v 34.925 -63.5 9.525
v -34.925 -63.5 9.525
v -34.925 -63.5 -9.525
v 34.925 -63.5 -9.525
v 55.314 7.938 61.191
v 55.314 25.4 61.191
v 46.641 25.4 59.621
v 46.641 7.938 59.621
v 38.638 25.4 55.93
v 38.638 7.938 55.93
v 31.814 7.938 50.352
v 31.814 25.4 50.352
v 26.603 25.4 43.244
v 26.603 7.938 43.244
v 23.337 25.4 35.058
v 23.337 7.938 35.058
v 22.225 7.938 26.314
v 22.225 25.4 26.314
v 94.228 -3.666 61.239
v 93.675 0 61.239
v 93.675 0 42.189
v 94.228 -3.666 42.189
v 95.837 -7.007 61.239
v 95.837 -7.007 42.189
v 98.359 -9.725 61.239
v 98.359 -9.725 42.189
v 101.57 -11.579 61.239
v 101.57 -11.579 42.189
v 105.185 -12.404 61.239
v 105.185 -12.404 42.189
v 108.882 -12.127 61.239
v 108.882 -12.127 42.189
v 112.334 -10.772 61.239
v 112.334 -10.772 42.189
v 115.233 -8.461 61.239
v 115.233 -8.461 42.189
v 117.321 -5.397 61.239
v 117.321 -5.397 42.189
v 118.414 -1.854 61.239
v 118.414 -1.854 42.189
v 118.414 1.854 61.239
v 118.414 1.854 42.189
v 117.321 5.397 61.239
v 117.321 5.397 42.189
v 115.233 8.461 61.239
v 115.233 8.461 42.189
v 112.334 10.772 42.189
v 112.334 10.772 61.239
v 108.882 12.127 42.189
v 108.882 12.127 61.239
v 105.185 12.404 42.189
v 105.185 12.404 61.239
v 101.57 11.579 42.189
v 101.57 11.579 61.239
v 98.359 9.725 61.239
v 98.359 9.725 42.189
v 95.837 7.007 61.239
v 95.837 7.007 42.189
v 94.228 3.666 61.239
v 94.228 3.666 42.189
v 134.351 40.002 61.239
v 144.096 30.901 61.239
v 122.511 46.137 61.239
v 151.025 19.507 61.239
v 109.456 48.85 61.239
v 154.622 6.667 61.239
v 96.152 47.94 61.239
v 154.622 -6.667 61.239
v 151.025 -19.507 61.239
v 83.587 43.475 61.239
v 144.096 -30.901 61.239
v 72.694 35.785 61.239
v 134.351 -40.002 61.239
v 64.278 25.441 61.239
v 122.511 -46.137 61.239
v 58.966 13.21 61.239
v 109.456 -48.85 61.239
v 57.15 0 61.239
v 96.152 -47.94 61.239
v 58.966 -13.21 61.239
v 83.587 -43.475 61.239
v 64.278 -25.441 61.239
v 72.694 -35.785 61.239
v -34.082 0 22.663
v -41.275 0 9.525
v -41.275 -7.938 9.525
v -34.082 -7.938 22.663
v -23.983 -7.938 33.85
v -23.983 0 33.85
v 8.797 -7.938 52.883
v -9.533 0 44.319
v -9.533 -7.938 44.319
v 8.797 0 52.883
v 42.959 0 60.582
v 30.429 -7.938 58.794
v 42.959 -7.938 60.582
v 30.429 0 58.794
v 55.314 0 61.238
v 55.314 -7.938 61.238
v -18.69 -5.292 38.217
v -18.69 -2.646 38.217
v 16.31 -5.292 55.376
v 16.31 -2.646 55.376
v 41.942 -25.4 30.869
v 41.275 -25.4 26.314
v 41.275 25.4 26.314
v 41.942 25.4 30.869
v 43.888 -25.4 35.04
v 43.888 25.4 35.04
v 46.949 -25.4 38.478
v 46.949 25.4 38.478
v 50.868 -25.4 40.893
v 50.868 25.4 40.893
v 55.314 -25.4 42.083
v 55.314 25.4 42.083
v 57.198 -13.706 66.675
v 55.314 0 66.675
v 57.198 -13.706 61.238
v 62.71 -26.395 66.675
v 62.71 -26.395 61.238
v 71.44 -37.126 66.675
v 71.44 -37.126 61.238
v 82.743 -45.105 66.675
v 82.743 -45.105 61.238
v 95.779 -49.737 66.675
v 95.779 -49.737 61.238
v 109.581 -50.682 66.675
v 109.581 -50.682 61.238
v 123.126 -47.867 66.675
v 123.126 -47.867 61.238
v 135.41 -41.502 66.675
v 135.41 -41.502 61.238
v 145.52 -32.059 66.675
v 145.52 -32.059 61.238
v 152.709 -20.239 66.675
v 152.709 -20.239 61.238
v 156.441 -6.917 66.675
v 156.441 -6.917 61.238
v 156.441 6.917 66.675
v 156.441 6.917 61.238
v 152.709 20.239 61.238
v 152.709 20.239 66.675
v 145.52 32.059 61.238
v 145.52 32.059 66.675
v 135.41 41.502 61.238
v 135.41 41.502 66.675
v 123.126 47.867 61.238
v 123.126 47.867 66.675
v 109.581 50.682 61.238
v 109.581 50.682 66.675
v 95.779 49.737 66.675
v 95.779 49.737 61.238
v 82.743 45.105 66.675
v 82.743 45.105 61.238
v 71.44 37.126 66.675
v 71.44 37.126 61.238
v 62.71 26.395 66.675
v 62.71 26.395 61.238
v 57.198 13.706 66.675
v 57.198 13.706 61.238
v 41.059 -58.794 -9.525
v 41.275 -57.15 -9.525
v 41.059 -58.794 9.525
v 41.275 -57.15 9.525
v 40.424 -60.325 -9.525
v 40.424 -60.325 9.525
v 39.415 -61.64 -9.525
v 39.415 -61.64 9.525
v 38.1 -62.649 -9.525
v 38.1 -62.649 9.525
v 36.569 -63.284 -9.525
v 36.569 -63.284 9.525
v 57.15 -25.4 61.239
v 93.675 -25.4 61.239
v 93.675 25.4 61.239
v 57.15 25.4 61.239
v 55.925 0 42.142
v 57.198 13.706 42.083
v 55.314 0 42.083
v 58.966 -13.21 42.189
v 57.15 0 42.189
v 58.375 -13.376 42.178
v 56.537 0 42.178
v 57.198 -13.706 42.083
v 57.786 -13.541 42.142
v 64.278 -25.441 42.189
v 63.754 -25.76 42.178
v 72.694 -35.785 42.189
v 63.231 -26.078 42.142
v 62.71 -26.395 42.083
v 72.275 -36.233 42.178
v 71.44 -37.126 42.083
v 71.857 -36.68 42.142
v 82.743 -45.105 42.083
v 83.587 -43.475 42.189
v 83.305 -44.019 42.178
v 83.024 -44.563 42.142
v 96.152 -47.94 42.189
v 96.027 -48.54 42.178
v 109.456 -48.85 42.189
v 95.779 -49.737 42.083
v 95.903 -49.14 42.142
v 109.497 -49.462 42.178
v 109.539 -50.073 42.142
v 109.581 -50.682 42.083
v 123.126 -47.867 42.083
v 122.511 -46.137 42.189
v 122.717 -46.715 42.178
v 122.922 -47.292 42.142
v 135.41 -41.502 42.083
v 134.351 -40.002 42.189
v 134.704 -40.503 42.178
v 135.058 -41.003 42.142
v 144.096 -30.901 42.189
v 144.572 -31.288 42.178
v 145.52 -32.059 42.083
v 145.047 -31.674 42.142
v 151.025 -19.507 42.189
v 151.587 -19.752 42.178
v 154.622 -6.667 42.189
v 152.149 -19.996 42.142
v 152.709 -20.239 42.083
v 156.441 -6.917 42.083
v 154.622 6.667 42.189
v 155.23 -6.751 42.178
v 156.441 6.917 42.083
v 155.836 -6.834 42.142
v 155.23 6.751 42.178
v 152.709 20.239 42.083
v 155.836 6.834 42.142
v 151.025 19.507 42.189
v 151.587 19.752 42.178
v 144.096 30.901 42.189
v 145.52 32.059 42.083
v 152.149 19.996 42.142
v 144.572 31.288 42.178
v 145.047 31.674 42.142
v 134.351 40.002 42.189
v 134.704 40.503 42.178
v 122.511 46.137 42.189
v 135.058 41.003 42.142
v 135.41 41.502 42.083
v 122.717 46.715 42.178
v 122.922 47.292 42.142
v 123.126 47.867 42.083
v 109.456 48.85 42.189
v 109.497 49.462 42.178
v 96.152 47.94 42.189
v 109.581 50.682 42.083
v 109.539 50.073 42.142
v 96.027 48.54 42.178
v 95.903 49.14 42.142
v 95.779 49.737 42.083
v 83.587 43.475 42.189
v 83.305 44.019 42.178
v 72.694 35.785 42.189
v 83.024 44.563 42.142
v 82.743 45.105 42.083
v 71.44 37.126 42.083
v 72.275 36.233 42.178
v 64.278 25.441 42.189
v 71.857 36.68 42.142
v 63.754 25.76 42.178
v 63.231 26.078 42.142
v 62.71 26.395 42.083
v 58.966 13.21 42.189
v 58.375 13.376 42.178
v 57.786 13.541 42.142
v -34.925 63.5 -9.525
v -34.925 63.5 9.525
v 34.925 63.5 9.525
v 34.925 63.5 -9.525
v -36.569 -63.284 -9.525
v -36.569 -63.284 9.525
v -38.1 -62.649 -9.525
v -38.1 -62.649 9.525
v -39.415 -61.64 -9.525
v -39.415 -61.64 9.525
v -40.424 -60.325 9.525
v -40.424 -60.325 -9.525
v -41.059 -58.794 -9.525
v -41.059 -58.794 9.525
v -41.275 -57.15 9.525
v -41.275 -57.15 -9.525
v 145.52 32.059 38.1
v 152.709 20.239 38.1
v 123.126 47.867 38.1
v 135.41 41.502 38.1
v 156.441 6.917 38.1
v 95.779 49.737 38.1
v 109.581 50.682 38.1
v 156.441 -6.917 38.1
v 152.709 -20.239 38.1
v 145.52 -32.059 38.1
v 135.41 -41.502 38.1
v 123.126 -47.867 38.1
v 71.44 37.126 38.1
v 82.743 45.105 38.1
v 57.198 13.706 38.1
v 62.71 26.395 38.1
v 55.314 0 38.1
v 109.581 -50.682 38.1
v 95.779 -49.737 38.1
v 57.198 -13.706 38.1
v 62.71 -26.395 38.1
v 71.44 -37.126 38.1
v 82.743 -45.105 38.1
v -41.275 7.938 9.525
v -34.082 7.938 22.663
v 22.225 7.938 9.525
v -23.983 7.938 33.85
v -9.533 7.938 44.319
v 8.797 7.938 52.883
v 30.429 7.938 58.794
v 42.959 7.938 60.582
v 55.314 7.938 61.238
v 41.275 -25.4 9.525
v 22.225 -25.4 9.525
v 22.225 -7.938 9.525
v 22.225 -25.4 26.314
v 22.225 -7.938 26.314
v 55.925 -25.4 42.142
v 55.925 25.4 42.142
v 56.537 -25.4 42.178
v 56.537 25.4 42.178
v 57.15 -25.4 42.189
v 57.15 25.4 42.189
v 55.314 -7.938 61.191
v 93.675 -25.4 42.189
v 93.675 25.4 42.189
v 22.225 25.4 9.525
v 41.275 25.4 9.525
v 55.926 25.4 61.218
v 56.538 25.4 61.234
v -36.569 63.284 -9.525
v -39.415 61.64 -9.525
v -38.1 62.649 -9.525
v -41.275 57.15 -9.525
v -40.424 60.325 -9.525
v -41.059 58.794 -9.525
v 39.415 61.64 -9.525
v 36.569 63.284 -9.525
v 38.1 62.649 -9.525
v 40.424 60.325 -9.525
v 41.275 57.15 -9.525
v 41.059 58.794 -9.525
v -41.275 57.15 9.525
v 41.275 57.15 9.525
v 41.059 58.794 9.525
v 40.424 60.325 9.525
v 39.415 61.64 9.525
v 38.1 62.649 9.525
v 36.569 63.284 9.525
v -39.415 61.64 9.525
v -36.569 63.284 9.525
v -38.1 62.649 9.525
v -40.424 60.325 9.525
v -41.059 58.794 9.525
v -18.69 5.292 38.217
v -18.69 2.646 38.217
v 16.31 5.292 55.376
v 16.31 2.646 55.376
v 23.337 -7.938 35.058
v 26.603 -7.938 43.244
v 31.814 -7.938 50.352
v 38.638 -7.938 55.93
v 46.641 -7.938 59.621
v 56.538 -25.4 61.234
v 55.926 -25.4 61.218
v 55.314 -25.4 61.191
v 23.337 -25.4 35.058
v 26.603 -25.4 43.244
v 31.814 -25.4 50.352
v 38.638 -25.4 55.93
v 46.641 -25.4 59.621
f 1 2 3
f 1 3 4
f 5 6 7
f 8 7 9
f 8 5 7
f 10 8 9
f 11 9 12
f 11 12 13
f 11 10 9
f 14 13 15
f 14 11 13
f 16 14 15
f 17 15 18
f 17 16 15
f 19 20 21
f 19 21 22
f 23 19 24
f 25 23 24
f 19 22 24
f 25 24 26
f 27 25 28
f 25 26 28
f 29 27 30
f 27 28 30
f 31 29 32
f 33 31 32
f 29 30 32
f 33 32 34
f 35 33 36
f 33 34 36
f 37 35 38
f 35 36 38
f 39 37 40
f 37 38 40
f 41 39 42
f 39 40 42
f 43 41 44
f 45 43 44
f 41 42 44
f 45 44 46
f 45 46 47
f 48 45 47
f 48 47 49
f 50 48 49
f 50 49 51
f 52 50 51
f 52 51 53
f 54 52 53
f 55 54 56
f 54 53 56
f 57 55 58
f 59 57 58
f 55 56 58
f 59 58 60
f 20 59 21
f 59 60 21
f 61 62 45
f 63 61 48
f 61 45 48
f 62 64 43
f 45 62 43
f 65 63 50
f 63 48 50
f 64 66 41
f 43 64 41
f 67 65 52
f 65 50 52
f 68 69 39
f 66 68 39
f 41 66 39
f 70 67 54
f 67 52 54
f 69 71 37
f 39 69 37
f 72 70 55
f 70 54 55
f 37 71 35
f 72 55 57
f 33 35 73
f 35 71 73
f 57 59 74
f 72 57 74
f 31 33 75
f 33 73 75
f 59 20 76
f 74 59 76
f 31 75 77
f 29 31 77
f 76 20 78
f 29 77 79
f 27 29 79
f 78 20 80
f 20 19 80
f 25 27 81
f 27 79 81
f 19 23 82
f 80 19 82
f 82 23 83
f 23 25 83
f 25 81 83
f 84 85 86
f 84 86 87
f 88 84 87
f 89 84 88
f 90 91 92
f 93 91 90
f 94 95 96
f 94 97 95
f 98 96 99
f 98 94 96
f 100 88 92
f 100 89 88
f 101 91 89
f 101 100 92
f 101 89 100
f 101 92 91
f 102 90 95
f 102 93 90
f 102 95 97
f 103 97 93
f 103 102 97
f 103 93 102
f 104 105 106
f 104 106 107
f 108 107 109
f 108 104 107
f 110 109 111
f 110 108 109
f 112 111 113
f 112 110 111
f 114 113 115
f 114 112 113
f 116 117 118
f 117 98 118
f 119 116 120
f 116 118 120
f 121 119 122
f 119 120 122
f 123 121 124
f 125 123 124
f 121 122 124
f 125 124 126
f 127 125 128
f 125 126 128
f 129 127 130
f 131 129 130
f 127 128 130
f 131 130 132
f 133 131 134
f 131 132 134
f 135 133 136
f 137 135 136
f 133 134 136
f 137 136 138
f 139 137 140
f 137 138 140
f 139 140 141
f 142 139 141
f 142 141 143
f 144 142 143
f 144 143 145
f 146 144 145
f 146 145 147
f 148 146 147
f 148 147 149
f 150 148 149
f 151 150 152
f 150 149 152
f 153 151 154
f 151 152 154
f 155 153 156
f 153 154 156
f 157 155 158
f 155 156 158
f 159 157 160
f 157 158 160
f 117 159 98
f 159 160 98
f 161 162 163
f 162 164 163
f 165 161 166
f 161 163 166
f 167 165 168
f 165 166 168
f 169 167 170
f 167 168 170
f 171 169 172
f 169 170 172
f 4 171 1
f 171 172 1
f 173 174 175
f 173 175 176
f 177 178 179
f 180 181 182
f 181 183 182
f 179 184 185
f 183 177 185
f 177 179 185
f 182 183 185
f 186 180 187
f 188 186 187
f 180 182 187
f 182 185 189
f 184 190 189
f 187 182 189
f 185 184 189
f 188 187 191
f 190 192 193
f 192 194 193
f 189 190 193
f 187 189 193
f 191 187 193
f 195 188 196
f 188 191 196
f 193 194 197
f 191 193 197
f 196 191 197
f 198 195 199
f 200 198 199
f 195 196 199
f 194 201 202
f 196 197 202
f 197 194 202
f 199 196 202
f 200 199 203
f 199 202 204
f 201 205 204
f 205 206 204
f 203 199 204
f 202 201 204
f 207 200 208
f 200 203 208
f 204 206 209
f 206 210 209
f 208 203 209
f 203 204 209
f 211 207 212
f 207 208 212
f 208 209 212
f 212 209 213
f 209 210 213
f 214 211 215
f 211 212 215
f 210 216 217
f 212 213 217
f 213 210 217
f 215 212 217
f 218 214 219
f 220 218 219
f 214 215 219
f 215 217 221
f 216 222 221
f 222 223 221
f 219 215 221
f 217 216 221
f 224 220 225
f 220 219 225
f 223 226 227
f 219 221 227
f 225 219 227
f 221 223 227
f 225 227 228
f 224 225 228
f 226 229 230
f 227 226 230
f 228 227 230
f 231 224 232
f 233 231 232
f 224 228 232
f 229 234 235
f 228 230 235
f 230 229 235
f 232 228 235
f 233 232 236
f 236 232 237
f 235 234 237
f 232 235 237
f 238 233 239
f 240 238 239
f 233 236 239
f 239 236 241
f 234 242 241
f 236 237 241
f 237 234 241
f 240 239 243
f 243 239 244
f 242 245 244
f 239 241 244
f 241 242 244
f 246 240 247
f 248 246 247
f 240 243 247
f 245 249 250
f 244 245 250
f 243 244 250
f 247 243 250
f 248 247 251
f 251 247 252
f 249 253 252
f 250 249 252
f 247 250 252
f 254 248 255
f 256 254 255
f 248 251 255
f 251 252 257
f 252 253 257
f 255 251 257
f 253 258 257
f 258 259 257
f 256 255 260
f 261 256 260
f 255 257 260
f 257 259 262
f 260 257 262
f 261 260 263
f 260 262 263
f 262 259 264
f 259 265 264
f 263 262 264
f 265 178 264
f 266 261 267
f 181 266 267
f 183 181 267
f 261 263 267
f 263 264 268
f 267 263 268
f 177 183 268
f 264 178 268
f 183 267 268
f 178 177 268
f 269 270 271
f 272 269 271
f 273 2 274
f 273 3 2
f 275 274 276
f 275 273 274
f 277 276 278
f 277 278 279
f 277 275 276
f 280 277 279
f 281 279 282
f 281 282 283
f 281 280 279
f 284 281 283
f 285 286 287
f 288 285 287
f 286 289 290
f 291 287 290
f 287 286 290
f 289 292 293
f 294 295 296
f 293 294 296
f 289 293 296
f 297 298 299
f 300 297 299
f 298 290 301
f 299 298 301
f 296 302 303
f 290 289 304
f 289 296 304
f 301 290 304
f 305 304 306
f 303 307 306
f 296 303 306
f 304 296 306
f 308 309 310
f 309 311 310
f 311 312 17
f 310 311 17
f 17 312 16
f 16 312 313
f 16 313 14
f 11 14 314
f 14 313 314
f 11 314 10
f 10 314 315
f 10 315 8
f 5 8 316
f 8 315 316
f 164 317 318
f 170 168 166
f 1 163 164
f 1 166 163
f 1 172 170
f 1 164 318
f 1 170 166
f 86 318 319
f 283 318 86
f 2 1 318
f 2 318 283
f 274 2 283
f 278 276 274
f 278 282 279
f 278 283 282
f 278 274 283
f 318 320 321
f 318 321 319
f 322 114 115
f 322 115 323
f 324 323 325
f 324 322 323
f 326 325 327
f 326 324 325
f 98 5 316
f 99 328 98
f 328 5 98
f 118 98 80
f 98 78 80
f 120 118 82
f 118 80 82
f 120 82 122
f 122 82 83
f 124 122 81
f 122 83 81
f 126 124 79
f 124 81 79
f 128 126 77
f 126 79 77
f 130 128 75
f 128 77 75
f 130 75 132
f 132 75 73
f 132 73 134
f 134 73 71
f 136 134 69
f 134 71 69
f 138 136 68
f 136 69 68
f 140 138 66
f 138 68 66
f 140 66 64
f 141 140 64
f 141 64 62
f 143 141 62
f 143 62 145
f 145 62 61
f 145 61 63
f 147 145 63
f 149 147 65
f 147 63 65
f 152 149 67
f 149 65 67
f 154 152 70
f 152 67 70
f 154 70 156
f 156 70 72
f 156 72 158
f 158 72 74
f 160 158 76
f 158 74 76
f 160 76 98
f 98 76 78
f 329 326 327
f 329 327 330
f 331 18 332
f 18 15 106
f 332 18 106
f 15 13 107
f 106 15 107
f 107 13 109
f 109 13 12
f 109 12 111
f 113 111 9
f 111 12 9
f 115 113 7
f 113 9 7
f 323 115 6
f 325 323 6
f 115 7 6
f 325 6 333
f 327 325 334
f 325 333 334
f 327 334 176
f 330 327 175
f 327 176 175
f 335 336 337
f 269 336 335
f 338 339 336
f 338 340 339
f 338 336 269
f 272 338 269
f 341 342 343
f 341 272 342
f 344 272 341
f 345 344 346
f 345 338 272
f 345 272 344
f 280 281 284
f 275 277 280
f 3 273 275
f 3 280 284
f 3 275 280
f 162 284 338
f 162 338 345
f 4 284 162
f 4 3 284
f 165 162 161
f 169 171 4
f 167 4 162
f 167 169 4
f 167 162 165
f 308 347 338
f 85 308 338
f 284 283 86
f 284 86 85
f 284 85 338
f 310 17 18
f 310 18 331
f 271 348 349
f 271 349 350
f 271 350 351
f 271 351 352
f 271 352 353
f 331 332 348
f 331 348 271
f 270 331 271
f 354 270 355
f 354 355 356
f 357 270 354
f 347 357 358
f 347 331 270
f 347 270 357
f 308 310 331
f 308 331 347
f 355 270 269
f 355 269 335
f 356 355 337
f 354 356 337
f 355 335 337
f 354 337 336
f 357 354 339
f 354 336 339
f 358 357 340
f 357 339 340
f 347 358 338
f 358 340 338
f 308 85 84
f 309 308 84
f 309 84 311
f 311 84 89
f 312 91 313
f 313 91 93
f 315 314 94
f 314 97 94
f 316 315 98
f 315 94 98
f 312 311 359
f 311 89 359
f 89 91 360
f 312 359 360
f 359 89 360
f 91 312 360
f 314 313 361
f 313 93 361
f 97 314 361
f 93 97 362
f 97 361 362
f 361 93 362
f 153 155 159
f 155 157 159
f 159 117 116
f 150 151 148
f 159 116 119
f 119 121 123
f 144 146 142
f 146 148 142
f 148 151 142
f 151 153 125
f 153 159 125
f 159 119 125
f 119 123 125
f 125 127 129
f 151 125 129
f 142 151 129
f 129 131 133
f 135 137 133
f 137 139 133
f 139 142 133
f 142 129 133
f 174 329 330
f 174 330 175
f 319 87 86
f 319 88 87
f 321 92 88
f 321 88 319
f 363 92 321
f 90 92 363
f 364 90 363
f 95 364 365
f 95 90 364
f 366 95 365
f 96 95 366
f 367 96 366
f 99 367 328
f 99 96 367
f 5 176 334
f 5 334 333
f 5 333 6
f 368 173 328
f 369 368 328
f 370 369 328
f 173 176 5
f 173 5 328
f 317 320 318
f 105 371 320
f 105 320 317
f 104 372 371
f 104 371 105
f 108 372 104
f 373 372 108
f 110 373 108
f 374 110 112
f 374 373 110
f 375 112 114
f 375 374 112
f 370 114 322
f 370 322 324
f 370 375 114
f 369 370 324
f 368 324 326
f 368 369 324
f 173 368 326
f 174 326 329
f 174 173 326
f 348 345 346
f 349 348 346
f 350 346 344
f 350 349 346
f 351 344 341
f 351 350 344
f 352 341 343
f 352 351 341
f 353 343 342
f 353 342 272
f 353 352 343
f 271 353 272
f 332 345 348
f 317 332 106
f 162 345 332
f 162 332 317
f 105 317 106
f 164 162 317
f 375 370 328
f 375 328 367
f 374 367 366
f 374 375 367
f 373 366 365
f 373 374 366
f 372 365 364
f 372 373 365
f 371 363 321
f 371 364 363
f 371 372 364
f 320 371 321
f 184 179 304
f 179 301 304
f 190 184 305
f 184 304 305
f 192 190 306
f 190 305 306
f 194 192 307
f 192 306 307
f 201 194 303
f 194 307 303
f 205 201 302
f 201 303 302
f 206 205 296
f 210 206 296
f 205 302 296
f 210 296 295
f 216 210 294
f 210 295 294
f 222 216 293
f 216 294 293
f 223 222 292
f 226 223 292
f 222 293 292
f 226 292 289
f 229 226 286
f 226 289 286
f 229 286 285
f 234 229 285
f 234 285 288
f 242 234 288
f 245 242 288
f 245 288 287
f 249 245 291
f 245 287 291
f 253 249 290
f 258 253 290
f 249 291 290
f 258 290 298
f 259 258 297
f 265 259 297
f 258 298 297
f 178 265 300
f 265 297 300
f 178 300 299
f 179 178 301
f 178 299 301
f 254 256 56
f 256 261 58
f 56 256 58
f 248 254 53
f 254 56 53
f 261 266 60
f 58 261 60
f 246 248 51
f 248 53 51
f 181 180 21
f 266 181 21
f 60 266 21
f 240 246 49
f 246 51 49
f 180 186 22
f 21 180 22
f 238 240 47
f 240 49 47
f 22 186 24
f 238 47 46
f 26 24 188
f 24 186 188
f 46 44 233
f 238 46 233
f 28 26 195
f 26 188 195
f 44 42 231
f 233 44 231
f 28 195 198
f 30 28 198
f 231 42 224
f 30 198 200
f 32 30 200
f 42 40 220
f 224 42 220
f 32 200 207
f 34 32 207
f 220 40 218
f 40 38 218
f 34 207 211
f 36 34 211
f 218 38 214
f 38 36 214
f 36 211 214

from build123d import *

# Parameters (mm, degrees)
F1_DEPTH = 63.5
F2_DEPTH = 25.4
F3_DEPTH = 7.9375
F5_R     = 6.35


with BuildPart() as f1:
    # F0 (on Front) → F1 (new body, symmetric)
    with BuildSketch(Plane.XZ):
        Polygon((41.275, -9.525), (41.275, 9.525), (22.225, 9.525), (-41.275, 9.525), (-41.275, -9.525), align=None)
    extrude(amount=F1_DEPTH, both=True)

    # F0 (on Front) → F2 (join, symmetric)
    with BuildSketch(Plane.XZ):
        with BuildLine():
            Line((22.225, 9.525), (41.275, 9.525))
            Line((41.275, 9.525), (41.275, 26.3144))
            ThreePointArc((41.275, 26.3144), (45.293372, 36.870725), (55.314181, 42.082894))
            Line((55.314181, 42.082894), (55.314181, 61.191117))
            ThreePointArc((55.314181, 61.191117), (31.813548, 50.352283), (22.225, 26.3144))
            Line((22.225, 26.3144), (22.225, 9.525))
        make_face()
        with BuildLine():
            Line((55.314181, 61.191117), (55.314181, 42.082894))
            ThreePointArc((55.314181, 42.082894), (56.230547, 42.162751), (57.15, 42.1894))
            Line((57.15, 42.1894), (93.6752, 42.1894))
            Line((93.6752, 42.1894), (93.6752, 61.2394))
            Line((93.6752, 61.2394), (57.15, 61.2394))
            ThreePointArc((57.15, 61.2394), (56.231773, 61.227327), (55.314181, 61.191117))
        make_face()
    extrude(amount=F2_DEPTH, both=True)

    # F0 (on Front) → F3 (join, symmetric)
    with BuildSketch(Plane.XZ):
        with BuildLine():
            Line((-41.275, 9.525), (22.225, 9.525))
            Line((22.225, 9.525), (22.225, 26.3144))
            ThreePointArc((22.225, 26.3144), (31.813548, 50.352283), (55.314181, 61.191117))
            Line((55.314181, 61.191117), (55.314181, 61.238162))
            add(Edge.make_bspline(
                [(-41.275, 9.525), (-27.701957, 44.061394), (17.112535, 60.946012), (55.314181, 61.238162)],
                knots=[0, 0, 0, 0, 109.426003, 109.426003, 109.426003, 109.426003], degree=3))
        make_face()
    extrude(amount=F3_DEPTH, both=True)

    # F5
    f5_edges = [f1.edges().sort_by_distance(p)[0] for p in [
        (41.275, -63.5, 0),
        (-41.275, -63.5, 0),
        (41.275, 63.5, 0),
        (-41.275, 63.5, 0),
    ]]
    fillet(f5_edges, radius=F5_R)


with BuildPart() as f4:
    # F0 (on Front) → F4 (revolve)
    with BuildSketch(Plane.XZ):
        with BuildLine():
            ThreePointArc((57.15, 42.1894), (56.230547, 42.162751), (55.314181, 42.082894))
            Line((55.314181, 42.082894), (55.314181, 38.1))
            Line((55.314181, 38.1), (106.114181, 38.1))
            Line((106.114181, 38.1), (106.114181, 66.675))
            Line((106.114181, 66.675), (55.314181, 66.675))
            Line((55.314181, 66.675), (55.314181, 61.238162))
            add(Edge.make_bspline(
                [(55.314181, 61.238162), (55.92788, 61.242855), (56.539872, 61.243267), (57.15, 61.2394)],
                knots=[109.426003, 109.426003, 109.426003, 109.426003, 111.183901, 111.183901, 111.183901, 111.183901], degree=3))
            Line((57.15, 61.2394), (93.6752, 61.2394))
            Line((93.6752, 61.2394), (93.6752, 42.1894))
            Line((93.6752, 42.1894), (57.15, 42.1894))
        make_face()
    revolve(axis=Axis((106.114181, 0, 52.3875), (0, 0, 1)))


solid = Compound([f1.part, f4.part])
